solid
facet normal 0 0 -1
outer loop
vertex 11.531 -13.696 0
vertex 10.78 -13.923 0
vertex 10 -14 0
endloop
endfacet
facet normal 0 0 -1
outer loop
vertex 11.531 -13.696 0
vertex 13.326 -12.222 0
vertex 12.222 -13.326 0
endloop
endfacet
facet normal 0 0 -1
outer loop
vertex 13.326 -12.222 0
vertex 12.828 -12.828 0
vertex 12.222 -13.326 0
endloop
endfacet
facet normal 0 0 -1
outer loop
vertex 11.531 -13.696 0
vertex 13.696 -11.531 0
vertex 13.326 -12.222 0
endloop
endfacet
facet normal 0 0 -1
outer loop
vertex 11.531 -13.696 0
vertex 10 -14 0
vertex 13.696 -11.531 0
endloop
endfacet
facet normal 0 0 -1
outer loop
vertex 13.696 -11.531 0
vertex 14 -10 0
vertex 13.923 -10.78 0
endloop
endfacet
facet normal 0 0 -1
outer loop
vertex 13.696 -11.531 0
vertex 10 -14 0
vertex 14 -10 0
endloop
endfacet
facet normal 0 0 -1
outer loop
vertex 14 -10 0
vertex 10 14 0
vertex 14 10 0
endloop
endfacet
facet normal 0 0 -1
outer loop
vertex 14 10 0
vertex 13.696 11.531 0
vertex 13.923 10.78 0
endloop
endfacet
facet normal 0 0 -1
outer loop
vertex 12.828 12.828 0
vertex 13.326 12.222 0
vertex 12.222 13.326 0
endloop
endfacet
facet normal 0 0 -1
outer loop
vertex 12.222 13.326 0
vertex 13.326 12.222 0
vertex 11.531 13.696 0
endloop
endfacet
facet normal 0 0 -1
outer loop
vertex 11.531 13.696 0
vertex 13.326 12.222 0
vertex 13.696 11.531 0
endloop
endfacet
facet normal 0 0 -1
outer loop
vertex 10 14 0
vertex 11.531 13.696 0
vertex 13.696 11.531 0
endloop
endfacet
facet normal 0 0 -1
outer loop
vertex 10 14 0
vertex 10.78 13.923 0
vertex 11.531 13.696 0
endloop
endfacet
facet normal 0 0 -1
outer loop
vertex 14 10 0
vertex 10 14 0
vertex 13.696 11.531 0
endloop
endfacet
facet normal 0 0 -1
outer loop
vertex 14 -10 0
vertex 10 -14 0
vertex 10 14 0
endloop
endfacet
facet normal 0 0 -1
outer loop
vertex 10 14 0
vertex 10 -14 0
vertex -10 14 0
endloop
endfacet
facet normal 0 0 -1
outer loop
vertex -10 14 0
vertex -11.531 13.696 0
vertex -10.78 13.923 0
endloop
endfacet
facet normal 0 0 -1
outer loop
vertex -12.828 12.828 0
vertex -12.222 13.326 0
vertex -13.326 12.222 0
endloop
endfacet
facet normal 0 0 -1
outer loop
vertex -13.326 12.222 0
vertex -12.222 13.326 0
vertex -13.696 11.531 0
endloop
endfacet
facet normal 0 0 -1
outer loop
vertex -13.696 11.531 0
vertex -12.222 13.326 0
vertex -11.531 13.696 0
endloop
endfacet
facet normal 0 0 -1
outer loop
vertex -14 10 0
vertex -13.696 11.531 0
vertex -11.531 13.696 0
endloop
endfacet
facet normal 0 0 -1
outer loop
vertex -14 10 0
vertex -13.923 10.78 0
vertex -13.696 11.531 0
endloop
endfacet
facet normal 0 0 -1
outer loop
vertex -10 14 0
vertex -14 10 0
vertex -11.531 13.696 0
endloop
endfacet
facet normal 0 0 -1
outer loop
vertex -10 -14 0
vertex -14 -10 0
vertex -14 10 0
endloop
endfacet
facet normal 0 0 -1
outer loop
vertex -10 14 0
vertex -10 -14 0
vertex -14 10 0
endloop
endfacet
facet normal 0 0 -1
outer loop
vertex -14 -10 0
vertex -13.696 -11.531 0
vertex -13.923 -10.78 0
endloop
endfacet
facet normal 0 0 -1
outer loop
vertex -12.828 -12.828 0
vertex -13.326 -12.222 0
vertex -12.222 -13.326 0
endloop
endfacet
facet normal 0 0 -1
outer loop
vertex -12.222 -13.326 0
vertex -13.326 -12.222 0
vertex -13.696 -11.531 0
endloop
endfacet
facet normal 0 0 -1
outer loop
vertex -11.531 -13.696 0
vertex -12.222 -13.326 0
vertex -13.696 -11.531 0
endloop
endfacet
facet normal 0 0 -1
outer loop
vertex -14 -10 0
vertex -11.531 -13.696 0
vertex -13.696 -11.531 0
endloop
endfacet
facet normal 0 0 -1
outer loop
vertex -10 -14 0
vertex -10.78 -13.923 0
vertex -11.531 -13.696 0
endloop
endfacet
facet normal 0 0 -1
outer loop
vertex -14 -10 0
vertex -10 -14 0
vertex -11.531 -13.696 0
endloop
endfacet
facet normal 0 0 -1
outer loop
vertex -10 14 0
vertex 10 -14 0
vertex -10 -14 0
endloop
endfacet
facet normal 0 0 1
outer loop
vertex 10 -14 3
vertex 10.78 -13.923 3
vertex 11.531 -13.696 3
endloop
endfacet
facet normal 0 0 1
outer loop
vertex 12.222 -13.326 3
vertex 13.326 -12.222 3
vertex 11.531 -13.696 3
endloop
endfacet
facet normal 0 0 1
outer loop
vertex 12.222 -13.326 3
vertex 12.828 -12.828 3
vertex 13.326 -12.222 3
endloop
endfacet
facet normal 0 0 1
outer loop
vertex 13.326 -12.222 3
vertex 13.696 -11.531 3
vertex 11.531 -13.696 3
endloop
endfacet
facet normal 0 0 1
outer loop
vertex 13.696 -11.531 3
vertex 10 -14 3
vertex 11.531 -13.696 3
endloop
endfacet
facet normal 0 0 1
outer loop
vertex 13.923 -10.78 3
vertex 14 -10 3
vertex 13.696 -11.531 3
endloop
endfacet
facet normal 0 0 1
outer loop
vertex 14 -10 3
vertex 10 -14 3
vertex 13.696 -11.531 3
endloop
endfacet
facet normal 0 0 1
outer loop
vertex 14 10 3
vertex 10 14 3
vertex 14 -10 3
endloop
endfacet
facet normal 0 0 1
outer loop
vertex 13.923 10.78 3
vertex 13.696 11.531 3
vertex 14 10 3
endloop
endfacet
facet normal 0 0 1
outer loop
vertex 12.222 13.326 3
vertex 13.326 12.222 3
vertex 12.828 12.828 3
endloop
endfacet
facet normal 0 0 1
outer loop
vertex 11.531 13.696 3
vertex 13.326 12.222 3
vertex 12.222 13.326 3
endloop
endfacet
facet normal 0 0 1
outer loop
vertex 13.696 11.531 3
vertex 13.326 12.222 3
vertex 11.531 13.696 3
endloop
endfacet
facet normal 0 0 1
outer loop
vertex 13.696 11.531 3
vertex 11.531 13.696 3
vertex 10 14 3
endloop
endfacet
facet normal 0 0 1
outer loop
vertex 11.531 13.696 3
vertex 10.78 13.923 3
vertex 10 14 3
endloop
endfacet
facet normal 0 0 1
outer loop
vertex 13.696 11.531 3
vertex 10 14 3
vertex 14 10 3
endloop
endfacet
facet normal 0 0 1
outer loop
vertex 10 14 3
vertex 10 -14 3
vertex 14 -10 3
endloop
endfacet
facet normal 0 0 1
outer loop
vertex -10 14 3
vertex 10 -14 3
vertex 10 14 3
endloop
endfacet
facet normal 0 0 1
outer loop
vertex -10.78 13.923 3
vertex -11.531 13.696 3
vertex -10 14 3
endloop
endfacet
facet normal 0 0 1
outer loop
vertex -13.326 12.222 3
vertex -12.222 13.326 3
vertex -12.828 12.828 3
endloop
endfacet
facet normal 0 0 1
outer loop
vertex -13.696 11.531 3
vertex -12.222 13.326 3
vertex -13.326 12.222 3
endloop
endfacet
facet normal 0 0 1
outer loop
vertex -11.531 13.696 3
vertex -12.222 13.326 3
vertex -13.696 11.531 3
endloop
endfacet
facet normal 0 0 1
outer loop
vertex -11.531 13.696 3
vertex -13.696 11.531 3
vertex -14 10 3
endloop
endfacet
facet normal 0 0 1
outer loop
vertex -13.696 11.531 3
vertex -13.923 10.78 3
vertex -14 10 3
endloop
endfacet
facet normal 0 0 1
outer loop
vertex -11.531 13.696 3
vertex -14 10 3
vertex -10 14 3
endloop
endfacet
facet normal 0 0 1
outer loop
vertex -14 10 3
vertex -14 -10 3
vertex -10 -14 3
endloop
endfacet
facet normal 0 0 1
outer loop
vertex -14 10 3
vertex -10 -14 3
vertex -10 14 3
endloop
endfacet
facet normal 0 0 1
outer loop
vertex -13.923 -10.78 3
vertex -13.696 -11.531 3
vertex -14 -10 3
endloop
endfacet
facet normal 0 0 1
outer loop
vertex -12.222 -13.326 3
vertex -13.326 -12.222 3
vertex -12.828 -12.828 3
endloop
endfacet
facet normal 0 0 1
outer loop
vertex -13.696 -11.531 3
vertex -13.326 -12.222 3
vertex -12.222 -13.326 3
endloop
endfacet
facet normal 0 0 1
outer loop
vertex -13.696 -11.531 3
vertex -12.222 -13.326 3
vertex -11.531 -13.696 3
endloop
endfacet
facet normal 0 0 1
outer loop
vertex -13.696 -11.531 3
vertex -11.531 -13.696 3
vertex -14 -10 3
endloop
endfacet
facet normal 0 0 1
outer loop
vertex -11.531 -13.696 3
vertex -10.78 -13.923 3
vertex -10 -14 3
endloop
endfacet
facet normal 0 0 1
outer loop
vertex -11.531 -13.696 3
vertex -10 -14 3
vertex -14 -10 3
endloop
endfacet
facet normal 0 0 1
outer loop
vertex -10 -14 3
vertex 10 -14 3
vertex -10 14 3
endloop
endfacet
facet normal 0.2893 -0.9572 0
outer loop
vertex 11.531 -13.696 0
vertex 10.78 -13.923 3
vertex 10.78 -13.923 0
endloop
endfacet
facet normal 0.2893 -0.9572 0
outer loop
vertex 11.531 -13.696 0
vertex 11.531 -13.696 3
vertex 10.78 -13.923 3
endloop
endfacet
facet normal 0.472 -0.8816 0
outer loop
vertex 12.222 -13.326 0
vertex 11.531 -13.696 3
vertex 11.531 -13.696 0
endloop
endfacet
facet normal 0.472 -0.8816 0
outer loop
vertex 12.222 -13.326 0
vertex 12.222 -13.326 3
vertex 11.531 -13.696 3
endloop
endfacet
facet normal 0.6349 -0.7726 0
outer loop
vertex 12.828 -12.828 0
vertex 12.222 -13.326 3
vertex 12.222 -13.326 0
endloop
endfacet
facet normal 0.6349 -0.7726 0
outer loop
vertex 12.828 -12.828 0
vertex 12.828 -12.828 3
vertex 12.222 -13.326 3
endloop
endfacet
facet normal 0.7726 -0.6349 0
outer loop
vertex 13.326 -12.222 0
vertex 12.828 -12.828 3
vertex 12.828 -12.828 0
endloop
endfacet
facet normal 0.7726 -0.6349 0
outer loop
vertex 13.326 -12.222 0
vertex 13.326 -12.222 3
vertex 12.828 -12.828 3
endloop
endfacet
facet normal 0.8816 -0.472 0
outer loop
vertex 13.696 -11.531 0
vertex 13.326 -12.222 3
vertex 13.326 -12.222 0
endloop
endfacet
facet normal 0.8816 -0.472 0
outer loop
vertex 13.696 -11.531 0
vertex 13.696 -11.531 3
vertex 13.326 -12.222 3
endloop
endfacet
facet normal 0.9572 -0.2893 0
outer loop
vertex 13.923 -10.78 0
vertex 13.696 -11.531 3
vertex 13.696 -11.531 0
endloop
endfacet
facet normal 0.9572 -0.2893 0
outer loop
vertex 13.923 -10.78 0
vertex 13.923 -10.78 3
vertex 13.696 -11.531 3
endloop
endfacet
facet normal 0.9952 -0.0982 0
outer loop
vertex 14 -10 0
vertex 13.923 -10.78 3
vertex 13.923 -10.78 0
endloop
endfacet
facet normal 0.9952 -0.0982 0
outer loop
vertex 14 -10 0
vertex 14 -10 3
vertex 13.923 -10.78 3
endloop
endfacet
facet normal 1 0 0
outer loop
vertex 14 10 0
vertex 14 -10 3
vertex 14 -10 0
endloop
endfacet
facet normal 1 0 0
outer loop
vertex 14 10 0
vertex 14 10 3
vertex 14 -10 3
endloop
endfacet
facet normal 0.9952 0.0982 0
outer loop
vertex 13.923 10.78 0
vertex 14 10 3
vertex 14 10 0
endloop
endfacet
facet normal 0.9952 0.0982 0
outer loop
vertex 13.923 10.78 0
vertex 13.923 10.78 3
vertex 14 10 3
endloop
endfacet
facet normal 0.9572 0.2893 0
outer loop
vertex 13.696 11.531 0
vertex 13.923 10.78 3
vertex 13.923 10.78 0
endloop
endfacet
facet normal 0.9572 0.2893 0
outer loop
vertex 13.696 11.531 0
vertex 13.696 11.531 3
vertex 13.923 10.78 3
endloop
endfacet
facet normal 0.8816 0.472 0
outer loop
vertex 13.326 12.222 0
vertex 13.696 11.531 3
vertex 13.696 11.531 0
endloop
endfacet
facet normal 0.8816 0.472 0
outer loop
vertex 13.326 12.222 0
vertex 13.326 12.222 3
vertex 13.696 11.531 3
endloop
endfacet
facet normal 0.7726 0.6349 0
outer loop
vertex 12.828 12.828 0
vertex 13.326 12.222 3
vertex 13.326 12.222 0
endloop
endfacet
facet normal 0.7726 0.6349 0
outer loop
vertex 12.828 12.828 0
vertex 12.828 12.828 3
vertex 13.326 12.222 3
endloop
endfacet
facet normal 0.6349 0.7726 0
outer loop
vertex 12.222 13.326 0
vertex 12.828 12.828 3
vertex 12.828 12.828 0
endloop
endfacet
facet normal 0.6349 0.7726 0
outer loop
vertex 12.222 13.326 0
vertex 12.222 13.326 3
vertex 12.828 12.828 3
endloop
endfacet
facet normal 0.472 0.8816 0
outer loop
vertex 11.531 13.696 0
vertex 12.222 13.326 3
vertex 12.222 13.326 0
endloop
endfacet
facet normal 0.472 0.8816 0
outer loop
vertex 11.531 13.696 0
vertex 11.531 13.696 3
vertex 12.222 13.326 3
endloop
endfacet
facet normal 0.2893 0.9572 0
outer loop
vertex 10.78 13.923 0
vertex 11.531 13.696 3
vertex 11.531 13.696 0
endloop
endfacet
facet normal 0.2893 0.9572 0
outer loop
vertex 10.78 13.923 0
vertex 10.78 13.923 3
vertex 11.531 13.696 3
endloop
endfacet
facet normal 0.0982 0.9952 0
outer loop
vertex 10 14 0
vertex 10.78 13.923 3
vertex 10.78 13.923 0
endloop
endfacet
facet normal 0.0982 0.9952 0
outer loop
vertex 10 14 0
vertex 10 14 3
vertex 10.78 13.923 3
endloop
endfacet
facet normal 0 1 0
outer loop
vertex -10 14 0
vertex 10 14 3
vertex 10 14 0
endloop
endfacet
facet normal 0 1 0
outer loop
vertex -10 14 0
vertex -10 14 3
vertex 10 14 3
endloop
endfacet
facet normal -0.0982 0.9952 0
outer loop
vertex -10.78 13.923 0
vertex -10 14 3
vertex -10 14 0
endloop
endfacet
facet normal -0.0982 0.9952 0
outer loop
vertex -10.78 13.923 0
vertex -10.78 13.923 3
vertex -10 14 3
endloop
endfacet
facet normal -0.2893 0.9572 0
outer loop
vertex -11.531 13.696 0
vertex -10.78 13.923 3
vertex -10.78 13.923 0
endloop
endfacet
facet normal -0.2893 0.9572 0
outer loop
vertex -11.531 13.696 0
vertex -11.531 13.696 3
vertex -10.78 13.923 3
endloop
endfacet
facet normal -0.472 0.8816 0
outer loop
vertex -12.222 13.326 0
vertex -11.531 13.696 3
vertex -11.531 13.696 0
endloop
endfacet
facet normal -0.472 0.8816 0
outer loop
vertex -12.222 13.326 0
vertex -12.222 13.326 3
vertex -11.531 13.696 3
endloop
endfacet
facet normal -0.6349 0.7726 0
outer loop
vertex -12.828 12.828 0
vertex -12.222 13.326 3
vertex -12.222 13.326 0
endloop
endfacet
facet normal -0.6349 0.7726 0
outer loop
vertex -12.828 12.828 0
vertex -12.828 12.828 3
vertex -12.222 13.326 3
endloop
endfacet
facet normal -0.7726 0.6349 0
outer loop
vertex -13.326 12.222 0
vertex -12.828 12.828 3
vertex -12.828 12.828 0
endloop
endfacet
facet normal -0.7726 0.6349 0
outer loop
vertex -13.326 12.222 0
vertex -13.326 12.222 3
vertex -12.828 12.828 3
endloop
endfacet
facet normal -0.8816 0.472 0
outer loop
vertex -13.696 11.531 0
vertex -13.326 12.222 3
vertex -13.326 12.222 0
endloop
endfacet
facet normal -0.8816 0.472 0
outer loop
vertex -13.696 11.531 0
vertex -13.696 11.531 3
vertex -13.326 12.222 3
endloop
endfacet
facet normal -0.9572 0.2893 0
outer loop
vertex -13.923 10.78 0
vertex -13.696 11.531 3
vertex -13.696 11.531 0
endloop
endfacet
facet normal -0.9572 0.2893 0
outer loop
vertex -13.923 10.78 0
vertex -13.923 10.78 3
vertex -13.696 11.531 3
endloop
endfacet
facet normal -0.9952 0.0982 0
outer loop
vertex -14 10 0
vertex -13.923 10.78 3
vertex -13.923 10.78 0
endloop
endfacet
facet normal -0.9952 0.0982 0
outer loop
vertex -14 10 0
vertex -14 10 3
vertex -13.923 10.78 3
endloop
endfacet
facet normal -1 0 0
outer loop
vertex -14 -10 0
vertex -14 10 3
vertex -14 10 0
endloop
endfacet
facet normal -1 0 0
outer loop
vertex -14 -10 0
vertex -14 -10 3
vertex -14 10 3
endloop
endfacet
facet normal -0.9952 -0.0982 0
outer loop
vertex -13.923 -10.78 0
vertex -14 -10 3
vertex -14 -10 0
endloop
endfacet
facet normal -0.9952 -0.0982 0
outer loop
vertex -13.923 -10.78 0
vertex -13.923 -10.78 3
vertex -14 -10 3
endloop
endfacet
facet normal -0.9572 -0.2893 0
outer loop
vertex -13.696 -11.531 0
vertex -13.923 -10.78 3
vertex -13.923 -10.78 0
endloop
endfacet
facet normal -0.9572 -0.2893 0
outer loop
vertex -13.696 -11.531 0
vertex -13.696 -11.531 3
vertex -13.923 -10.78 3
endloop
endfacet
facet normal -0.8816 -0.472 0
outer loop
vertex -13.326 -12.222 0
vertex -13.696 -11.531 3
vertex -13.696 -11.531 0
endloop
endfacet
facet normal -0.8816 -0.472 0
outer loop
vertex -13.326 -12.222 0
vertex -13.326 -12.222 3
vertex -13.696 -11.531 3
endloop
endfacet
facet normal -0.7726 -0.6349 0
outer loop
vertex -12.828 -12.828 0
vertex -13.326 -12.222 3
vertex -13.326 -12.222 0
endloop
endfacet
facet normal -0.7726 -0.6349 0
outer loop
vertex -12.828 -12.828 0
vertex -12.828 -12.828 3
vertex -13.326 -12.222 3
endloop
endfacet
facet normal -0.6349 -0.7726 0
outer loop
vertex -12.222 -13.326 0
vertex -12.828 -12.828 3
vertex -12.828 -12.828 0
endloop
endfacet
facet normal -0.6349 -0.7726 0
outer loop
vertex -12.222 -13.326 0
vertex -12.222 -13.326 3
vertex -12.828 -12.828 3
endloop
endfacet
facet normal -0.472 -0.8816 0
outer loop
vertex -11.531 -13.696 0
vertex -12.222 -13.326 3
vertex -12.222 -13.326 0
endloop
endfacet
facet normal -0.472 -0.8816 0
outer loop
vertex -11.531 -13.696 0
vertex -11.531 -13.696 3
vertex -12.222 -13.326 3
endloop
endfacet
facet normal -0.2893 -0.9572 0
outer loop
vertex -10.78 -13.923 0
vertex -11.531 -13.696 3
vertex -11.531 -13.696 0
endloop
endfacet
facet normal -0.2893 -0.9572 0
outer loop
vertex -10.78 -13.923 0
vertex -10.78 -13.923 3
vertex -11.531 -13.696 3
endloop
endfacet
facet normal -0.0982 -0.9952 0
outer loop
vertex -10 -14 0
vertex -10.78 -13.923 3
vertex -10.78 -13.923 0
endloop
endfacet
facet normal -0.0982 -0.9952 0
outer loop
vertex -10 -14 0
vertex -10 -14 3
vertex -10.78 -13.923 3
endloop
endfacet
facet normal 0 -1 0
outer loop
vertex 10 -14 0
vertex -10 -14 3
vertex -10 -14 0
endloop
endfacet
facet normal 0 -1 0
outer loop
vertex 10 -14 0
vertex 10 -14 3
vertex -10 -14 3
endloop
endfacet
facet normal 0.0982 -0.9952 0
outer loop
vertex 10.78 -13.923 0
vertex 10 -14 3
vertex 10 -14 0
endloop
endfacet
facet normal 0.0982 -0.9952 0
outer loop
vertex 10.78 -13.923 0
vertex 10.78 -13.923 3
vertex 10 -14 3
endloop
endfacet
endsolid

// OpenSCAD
linear_extrude(3) offset(r=4, $fn=32) difference(){ square([20,20],center=true); square([6,6],center=true); }
